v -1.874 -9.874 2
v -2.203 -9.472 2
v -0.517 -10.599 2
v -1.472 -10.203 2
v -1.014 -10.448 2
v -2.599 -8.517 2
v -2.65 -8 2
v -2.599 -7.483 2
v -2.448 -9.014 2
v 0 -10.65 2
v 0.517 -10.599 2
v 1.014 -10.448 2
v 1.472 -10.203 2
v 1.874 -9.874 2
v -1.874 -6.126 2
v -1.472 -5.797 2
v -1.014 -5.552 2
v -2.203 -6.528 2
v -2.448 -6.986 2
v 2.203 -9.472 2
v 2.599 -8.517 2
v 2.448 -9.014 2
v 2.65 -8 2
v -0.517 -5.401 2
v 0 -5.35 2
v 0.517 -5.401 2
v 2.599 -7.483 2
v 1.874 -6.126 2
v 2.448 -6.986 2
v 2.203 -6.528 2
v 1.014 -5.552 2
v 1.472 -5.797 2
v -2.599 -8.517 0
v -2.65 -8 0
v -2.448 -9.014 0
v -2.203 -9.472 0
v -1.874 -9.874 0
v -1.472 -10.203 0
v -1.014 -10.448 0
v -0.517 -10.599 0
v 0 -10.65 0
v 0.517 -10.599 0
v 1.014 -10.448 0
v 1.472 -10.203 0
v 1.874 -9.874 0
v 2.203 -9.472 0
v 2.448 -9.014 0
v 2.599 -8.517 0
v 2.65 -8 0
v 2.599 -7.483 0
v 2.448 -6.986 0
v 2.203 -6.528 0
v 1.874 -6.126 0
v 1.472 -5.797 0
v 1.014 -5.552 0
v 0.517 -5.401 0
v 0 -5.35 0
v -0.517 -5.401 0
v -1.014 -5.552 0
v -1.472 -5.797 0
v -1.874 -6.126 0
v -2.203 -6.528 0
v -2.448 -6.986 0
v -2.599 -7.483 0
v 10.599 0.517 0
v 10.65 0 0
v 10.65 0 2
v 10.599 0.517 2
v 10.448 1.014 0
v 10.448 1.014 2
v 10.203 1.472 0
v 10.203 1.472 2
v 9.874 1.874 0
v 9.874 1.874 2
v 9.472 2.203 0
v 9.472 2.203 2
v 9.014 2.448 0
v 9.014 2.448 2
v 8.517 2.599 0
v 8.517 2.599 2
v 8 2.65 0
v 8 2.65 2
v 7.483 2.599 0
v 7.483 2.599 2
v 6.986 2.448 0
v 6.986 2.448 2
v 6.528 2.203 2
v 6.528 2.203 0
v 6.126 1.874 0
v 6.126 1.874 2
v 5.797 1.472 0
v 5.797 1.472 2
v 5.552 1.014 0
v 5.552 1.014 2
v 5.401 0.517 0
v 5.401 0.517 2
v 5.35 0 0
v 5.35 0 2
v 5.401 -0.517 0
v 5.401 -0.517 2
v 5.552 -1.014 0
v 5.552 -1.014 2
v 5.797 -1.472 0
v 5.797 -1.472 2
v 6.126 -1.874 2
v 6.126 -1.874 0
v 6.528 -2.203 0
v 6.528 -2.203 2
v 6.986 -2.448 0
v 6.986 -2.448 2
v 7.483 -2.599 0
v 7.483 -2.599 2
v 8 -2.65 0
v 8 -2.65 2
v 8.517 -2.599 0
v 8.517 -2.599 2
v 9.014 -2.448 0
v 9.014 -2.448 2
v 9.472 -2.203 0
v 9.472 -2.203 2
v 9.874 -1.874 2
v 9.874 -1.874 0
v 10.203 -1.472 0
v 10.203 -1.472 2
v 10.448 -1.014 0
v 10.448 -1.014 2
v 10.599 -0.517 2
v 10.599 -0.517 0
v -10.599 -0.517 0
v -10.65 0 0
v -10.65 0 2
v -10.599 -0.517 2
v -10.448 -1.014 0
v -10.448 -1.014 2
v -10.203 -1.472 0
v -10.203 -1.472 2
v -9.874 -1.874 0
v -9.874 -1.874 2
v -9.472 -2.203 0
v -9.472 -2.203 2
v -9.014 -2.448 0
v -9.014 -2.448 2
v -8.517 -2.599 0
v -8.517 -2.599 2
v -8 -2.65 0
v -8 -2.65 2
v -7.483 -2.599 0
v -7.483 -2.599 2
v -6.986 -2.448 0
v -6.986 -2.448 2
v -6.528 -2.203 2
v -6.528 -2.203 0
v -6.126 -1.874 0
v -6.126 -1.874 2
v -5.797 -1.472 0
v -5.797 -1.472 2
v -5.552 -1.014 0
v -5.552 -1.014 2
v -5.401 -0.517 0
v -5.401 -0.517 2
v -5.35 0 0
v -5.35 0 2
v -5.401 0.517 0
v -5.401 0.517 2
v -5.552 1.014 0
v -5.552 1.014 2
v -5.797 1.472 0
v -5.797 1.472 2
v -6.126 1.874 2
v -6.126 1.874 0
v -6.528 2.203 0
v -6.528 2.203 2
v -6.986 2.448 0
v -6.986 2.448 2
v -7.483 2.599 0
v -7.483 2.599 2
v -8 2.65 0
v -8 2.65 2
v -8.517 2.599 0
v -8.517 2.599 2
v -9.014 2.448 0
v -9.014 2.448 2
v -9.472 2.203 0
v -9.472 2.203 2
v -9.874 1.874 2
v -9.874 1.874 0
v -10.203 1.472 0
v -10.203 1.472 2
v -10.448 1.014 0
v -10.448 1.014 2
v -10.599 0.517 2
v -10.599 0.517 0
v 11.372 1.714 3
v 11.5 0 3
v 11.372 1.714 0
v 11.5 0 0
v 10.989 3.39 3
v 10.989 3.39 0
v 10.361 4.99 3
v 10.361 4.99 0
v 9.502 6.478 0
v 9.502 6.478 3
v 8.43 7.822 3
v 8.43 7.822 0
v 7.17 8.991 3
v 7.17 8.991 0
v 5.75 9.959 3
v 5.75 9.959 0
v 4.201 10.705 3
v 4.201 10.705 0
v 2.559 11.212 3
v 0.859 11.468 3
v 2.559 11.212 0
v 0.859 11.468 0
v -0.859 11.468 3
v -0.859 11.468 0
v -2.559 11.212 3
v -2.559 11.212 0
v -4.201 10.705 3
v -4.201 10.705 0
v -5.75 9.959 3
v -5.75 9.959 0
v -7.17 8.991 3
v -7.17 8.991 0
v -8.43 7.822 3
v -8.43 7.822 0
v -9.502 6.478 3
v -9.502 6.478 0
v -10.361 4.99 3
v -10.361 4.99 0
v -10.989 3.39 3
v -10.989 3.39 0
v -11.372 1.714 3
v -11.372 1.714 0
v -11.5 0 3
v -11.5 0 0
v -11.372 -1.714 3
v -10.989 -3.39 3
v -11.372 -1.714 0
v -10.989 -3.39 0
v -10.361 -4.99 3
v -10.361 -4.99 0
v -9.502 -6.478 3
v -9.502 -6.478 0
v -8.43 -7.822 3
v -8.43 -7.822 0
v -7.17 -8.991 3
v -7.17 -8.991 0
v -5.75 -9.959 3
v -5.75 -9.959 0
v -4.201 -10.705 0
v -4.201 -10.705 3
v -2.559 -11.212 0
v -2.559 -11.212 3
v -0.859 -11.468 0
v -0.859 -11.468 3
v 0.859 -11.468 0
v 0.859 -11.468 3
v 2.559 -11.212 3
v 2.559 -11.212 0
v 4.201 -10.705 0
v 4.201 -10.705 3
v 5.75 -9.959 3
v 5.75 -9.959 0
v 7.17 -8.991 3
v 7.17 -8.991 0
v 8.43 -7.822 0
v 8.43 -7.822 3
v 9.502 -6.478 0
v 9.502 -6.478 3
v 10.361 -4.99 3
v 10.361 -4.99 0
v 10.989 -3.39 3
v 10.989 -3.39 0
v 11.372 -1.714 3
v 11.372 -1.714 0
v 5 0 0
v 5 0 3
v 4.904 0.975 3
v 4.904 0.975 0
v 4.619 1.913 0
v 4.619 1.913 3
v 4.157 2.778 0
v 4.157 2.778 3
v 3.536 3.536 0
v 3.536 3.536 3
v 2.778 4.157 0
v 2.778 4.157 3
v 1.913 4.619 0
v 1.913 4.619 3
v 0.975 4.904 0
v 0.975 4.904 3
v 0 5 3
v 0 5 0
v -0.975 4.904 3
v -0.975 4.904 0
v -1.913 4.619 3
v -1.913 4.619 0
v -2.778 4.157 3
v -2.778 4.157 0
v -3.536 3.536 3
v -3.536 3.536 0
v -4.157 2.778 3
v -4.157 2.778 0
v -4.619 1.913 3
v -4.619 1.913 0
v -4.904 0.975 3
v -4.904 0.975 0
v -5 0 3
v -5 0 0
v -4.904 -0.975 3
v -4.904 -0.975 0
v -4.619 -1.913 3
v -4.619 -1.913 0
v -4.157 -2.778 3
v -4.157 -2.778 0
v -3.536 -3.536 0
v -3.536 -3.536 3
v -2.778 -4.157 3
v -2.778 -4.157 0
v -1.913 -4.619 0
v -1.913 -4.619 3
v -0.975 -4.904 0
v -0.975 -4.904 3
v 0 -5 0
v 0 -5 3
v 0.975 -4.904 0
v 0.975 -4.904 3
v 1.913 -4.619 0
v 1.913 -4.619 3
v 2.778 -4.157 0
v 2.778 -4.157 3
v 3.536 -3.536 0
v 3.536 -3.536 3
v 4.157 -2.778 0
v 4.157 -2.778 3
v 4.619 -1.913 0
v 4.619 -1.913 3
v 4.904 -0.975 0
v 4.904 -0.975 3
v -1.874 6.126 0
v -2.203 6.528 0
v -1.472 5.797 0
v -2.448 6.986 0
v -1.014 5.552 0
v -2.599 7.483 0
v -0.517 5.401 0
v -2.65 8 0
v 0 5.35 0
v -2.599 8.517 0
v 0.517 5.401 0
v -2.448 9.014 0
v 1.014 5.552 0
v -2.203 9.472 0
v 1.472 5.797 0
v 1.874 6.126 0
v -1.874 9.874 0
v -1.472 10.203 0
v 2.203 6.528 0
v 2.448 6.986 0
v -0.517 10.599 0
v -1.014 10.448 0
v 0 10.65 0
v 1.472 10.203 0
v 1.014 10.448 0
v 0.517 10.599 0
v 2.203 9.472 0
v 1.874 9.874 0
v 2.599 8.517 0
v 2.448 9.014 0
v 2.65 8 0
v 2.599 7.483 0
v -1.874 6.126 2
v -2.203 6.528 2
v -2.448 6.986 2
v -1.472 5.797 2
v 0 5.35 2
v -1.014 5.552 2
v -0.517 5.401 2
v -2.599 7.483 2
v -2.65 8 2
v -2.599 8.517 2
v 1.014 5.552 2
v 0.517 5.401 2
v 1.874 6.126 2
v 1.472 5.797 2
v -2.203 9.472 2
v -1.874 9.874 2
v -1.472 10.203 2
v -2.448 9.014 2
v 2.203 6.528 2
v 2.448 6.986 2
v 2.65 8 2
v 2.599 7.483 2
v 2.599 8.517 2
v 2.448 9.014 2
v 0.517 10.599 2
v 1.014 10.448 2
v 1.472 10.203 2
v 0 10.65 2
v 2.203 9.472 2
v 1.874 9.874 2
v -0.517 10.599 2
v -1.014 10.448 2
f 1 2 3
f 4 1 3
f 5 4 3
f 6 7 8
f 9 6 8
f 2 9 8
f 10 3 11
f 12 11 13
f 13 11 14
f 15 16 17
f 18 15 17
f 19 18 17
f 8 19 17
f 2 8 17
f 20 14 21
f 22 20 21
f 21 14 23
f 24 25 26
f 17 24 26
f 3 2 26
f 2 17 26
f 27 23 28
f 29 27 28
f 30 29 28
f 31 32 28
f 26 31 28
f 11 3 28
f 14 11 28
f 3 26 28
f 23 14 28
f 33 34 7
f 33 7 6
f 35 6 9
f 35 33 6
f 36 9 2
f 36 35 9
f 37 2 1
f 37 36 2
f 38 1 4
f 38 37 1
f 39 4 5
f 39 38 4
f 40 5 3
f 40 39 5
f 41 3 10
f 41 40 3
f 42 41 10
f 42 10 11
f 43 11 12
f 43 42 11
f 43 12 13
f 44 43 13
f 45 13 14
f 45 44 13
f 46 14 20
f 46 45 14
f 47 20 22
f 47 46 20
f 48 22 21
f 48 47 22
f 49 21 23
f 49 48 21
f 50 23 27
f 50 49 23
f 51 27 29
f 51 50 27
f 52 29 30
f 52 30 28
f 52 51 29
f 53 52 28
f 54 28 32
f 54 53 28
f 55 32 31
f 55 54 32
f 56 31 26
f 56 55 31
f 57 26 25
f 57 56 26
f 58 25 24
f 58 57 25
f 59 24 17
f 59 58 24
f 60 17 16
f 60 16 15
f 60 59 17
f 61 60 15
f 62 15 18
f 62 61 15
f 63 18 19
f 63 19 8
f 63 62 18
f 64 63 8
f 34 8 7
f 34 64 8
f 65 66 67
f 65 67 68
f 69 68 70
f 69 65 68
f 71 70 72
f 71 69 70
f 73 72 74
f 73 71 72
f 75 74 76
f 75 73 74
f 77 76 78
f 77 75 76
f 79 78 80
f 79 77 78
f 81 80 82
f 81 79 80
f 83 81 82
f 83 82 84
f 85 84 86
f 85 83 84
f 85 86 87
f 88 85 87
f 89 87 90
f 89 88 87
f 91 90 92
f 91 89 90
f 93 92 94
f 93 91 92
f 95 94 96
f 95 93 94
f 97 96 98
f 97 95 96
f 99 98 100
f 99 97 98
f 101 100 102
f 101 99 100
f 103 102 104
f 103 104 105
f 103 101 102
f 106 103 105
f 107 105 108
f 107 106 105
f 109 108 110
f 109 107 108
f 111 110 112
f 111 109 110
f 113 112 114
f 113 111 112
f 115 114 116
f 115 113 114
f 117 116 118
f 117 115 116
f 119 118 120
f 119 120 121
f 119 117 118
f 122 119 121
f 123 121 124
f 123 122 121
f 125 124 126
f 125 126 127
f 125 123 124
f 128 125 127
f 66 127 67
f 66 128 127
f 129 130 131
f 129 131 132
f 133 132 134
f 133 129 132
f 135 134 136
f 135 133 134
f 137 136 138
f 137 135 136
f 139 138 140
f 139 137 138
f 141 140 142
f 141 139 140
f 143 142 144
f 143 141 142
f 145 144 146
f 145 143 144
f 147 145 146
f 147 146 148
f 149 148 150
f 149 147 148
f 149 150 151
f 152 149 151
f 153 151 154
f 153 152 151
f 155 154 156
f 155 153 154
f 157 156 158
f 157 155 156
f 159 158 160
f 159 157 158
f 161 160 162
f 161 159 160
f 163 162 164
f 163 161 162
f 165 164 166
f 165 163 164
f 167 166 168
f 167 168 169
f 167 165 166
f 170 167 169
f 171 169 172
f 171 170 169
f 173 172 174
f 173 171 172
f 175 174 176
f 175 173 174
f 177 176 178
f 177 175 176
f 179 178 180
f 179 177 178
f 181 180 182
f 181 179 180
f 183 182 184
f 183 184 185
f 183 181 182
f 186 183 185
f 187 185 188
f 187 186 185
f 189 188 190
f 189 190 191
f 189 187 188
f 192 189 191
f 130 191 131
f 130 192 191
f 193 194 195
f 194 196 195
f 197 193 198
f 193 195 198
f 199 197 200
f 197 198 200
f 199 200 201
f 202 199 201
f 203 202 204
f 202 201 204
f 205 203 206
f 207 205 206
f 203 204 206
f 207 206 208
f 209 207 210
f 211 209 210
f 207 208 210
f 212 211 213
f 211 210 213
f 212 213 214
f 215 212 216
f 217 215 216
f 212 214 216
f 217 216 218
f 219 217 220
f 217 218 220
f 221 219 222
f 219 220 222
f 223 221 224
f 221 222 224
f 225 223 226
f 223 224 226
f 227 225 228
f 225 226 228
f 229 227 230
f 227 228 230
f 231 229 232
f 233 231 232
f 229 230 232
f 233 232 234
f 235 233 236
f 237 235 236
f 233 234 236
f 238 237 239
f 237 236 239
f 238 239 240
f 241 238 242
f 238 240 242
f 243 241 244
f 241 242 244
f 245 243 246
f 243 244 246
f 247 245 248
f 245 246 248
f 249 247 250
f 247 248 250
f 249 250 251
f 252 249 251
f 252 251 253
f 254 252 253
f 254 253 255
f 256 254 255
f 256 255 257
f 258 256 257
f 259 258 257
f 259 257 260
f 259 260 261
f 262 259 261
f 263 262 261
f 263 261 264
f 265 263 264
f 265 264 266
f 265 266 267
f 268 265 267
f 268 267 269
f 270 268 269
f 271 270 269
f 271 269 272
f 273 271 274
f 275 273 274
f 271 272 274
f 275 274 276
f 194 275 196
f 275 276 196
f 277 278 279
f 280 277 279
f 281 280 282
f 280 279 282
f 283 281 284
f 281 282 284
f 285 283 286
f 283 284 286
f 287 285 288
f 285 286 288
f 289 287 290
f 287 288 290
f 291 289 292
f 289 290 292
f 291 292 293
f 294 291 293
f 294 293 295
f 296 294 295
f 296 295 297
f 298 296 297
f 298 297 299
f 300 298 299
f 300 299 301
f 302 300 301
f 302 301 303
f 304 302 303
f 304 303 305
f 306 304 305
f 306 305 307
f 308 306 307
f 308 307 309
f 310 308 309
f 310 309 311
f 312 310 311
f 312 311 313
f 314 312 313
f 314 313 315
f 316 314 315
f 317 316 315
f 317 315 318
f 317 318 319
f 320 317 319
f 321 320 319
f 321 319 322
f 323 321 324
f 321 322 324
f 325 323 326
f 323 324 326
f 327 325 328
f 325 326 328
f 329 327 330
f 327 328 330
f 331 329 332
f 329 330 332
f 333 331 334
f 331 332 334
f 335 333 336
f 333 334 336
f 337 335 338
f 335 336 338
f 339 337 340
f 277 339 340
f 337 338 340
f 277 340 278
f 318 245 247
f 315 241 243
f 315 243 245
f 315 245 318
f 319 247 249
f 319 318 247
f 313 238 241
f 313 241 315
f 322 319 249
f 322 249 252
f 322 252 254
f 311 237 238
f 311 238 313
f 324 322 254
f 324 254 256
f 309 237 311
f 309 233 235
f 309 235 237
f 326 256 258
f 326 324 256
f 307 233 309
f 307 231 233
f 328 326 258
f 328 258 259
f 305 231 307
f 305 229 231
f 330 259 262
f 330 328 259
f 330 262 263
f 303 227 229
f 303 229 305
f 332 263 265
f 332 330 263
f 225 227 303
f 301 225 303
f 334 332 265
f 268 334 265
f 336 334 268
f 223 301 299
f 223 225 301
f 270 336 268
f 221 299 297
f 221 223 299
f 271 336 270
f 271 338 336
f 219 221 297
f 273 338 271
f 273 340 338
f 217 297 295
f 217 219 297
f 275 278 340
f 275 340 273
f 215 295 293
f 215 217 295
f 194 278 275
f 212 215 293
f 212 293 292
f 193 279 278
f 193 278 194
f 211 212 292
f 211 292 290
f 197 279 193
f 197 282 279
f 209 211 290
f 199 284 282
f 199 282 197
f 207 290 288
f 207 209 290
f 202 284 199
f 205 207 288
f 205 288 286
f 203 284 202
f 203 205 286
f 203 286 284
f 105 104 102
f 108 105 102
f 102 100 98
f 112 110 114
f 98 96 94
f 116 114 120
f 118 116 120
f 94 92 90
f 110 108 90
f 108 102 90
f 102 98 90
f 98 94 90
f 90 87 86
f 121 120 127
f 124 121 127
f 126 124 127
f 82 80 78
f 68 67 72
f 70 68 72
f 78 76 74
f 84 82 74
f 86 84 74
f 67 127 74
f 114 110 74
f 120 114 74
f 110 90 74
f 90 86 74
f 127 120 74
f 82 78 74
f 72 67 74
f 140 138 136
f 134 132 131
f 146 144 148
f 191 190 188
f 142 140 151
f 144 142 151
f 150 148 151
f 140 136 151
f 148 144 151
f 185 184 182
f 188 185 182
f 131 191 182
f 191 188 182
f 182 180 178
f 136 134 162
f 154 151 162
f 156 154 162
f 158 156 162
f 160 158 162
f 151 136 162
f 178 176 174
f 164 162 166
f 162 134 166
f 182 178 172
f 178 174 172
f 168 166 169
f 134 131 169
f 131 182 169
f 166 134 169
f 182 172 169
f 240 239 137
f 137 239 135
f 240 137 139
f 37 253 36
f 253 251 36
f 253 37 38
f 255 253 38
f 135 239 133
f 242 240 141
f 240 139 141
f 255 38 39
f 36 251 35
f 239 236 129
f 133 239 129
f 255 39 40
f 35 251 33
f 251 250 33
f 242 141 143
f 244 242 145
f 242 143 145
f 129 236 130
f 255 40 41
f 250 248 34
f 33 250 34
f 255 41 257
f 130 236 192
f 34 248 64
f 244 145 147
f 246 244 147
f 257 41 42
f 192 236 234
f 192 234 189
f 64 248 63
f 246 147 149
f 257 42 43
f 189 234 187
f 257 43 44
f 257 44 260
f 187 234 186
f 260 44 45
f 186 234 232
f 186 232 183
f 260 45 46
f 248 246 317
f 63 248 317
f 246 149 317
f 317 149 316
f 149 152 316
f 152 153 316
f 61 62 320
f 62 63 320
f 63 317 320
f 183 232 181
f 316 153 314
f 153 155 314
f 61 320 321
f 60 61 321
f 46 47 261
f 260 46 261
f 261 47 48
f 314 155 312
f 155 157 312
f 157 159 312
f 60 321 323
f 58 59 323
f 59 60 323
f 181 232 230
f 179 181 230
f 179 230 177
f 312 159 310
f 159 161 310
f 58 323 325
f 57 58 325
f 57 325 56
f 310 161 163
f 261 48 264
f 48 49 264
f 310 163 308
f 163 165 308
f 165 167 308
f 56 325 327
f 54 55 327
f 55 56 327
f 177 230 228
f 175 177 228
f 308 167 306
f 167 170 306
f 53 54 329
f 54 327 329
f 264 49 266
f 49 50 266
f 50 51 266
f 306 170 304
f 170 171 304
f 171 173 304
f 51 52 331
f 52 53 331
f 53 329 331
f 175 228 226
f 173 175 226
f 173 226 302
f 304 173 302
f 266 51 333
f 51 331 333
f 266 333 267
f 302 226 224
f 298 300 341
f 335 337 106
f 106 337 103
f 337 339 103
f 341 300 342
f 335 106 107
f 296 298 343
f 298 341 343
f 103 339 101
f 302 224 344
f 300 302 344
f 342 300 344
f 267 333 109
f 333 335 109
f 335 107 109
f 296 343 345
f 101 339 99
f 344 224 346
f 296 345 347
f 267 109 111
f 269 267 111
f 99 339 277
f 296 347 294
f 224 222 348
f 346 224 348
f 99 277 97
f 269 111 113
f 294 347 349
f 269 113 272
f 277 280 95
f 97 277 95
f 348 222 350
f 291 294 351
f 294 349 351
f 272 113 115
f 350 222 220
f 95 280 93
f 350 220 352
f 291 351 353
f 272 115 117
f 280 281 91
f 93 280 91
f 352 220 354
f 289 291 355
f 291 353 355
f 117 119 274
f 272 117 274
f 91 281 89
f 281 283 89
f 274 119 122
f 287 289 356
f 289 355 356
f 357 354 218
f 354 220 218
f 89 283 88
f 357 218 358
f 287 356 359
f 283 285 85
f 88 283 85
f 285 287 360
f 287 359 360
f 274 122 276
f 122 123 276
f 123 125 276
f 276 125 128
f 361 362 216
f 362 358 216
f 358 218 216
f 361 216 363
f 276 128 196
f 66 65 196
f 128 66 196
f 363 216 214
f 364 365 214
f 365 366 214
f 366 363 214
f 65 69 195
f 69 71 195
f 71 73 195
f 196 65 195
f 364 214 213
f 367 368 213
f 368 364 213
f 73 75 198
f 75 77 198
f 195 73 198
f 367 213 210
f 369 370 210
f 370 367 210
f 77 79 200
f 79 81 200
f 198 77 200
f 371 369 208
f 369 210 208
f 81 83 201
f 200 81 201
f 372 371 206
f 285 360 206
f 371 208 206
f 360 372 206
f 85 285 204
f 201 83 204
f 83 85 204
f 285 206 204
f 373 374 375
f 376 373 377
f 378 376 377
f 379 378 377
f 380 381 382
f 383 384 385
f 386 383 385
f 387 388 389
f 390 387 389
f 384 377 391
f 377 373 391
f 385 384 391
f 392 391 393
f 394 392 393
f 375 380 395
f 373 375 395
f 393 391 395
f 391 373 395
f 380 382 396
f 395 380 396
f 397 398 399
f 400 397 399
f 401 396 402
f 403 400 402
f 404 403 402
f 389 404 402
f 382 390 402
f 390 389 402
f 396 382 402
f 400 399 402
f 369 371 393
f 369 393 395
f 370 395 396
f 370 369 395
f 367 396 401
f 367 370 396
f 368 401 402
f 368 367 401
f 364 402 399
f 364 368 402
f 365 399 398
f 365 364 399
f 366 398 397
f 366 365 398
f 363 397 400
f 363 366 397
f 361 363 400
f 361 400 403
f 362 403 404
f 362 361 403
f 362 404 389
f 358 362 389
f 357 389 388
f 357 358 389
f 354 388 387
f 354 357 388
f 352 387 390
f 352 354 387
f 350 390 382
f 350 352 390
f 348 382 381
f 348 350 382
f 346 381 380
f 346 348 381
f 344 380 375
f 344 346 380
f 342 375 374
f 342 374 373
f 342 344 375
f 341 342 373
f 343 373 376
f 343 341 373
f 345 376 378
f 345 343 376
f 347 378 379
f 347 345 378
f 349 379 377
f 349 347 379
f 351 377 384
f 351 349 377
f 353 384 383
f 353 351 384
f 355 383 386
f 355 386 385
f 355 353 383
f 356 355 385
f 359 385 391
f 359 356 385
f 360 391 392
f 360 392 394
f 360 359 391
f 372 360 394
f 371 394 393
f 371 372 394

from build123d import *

# Parameters (mm, degrees)
SKETCH_1_R          = 11.5
SKETCH_1_R_2        = 2.65
EXTRUDE_1_DEPTH     = 2
SKETCH_2_R          = 11.5
EXTRUDE_2_DEPTH     = 1
SKETCH_3_R          = 5
CUT_EXTRUDE_1_DEPTH = 10


with BuildPart() as part:
    # 草图1 → 凸台-拉伸1 (new body)
    with BuildSketch(Plane.XY):
        Circle(SKETCH_1_R)
        with Locations((0, 8)):
            Circle(SKETCH_1_R_2, mode=Mode.SUBTRACT)
        with Locations((8, 0)):
            Circle(SKETCH_1_R_2, mode=Mode.SUBTRACT)
        with Locations(Location((0, -8, 0), (0, 0, 180))):
            Circle(SKETCH_1_R_2, mode=Mode.SUBTRACT)
        with Locations(Location((-8, 0, 0), (0, 0, 180))):
            Circle(SKETCH_1_R_2, mode=Mode.SUBTRACT)
    extrude(amount=EXTRUDE_1_DEPTH)

    # 草图2 → 凸台-拉伸2 (add)
    with BuildSketch(Plane.XY.offset(2)):
        Circle(SKETCH_2_R)
    extrude(amount=EXTRUDE_2_DEPTH)

    # 草图3 → 切除-拉伸1 (cut)
    with BuildSketch(Plane.XY.offset(3)):
        Circle(SKETCH_3_R)
    extrude(amount=-CUT_EXTRUDE_1_DEPTH, mode=Mode.SUBTRACT)


solid = part.part
